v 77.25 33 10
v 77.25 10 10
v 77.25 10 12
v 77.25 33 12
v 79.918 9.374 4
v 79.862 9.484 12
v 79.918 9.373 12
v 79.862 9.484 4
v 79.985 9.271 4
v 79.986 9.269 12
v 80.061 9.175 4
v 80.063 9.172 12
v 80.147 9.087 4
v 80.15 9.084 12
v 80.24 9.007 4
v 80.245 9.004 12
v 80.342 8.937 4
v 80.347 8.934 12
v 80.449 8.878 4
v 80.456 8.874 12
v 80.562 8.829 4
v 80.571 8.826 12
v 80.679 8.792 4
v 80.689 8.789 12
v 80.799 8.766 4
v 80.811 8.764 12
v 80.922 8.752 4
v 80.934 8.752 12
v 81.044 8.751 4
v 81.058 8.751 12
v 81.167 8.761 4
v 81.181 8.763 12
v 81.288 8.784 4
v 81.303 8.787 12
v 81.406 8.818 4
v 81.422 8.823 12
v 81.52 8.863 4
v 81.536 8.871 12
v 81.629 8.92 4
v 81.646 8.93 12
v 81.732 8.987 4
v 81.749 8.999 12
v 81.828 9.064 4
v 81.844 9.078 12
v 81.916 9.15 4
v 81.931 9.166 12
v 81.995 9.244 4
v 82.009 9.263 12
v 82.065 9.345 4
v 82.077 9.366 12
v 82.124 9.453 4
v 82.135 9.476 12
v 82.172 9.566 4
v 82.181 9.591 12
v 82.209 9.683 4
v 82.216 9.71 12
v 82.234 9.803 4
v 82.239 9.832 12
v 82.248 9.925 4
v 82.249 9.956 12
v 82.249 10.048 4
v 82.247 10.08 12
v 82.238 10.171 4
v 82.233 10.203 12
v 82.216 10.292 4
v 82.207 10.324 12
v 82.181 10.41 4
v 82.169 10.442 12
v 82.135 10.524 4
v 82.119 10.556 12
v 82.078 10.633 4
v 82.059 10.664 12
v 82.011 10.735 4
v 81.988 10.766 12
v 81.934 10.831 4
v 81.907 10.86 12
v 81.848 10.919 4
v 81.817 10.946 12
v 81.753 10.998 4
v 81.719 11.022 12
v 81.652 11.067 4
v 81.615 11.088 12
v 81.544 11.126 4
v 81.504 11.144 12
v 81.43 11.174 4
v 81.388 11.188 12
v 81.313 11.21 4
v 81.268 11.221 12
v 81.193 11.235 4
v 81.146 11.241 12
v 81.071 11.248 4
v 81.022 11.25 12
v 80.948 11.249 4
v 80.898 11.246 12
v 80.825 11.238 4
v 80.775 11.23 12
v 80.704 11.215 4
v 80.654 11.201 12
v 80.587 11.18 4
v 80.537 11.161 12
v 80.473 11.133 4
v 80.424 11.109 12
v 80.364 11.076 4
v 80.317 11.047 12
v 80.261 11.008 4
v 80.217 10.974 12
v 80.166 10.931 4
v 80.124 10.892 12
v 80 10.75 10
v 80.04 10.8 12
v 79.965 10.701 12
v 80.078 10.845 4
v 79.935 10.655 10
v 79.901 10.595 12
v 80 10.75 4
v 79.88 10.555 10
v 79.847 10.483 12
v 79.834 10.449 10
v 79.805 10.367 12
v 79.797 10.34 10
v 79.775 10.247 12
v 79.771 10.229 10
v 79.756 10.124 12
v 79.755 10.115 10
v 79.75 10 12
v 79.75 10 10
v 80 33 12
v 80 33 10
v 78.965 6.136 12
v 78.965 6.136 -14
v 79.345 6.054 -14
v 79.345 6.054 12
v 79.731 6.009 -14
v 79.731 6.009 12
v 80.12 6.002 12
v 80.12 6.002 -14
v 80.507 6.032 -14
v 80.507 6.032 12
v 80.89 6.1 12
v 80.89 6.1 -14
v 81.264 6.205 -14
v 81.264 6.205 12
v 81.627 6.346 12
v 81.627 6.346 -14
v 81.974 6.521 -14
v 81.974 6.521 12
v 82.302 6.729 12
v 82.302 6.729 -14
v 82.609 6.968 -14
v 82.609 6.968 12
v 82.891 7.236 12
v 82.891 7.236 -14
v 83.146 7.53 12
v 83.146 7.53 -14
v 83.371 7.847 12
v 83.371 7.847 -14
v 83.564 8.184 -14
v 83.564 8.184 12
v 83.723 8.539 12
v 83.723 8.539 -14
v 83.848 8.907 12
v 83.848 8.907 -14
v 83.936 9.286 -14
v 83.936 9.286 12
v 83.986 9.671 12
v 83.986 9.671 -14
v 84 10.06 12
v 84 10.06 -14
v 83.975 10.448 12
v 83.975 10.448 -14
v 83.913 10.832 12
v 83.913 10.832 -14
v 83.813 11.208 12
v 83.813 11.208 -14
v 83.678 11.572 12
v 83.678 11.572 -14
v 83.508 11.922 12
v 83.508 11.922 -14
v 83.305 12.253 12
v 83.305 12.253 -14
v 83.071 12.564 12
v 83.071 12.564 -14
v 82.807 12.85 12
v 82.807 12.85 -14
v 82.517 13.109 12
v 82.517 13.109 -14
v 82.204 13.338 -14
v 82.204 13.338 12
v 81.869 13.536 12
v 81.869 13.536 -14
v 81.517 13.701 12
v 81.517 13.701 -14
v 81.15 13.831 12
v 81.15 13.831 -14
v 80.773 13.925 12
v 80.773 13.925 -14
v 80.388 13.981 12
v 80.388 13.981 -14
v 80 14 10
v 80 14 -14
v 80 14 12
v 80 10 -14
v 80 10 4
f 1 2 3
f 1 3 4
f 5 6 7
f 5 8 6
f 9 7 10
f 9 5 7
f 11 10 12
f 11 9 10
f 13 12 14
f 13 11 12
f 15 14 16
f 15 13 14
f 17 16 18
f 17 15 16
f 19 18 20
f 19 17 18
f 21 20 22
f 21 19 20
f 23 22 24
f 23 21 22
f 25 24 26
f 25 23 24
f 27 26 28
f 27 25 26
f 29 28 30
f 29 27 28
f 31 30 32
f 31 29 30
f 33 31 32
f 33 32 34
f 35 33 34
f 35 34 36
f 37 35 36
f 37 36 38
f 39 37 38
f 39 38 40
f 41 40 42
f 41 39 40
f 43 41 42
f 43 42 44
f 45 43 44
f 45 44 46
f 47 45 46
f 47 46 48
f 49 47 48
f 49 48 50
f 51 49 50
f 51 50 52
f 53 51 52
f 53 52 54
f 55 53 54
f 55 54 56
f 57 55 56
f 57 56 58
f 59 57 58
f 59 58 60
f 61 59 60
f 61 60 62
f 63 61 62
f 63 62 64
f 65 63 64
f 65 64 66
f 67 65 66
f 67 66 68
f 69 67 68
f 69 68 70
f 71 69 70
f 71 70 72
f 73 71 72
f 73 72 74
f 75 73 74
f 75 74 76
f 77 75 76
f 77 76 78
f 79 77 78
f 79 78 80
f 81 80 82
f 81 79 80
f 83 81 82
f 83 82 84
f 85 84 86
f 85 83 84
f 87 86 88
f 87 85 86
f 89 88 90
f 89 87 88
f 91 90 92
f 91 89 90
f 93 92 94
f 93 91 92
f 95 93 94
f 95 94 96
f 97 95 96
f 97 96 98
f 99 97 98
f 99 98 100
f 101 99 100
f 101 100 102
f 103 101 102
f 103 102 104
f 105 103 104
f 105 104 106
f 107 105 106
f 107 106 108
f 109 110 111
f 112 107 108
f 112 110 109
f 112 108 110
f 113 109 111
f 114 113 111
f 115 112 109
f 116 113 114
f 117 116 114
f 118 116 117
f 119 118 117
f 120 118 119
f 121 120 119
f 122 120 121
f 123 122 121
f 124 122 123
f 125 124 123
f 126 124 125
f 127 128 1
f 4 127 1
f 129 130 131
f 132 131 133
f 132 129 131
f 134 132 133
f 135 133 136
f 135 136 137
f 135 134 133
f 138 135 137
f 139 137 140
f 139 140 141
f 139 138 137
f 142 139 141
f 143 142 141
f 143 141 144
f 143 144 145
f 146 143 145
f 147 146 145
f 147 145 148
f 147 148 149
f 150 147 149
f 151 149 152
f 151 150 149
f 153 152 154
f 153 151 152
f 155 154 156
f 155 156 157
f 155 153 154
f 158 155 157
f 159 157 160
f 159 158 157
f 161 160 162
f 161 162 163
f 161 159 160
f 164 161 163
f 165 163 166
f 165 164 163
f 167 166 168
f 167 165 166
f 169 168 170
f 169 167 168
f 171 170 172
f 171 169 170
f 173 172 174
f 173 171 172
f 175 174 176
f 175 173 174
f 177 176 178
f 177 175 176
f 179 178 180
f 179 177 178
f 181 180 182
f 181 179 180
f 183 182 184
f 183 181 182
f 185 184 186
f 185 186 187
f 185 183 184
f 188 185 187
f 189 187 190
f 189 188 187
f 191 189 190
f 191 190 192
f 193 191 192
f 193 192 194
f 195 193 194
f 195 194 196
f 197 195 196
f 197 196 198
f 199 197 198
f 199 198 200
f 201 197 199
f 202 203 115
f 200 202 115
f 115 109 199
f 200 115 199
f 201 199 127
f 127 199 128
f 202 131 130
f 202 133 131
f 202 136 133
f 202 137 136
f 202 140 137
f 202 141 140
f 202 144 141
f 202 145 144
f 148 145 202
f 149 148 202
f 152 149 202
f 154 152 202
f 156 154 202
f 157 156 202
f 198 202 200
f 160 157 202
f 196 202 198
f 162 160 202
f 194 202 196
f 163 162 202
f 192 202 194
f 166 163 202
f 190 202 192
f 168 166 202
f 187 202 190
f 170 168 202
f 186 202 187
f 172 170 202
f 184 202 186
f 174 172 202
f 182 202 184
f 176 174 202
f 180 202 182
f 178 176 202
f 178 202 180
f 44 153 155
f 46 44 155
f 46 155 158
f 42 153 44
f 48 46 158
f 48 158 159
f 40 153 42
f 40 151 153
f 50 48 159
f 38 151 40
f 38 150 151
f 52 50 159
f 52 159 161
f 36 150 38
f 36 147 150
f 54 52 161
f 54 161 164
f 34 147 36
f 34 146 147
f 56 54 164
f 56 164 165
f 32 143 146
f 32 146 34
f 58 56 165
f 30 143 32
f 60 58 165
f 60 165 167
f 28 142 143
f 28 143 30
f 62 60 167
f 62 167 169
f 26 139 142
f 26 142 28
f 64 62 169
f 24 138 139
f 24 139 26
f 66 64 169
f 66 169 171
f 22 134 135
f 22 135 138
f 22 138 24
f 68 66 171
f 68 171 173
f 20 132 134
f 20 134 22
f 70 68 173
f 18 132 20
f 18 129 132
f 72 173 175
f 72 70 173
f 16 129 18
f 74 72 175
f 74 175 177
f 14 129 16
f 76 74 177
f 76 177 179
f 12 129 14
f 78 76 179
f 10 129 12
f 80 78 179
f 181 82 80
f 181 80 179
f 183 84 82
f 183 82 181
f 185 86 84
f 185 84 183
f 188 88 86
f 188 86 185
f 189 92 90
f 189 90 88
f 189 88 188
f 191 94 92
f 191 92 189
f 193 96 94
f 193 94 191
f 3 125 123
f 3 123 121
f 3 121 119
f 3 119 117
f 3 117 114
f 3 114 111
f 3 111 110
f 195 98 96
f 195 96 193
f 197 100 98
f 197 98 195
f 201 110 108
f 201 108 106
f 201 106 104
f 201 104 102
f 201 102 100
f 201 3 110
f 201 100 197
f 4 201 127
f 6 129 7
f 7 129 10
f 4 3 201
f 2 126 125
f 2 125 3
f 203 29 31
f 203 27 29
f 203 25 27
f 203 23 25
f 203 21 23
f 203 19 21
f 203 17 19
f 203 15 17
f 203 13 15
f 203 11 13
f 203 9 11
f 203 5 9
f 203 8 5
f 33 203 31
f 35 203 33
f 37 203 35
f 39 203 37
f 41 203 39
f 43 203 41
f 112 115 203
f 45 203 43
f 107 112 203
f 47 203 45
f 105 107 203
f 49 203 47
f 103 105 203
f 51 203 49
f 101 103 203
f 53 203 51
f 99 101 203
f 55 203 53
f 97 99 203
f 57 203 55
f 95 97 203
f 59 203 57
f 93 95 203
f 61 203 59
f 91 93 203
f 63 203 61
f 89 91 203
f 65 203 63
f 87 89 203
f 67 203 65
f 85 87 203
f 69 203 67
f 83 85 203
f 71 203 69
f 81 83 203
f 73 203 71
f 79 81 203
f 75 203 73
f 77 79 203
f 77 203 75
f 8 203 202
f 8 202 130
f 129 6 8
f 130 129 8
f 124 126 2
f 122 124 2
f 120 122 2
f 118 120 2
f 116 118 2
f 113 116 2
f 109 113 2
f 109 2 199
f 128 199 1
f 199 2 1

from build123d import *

# Parameters (mm, degrees)
CYLINDER005_R               = 1.25
CYLINDER005_DEPTH           = 10
BOX007_W                    = 23
BOX007_H                    = 2.75
BOX007_DEPTH                = 2
CYLINDER002_W               = 4
CYLINDER002_H               = 26
CYLINDER002_ANGLE           = 195
CYLINDER002_PLACEMENT_ANGLE = 105


with BuildPart() as b_so:
    # Cylinder005 → Cylinder005 (new body)
    with BuildSketch(Plane(origin=(41, 5, 4), x_dir=(1, 0, 0), z_dir=(0, 0, 1))):
        Circle(CYLINDER005_R)
    extrude(amount=CYLINDER005_DEPTH)


with BuildPart() as o001:
    # Box007 → Box007 (new body)
    with BuildSketch(Plane(origin=(40, 5, 10), x_dir=(0, 1, 0), z_dir=(0, 0, 1))):
        with Locations((11.5, 1.375)):
            Rectangle(BOX007_W, BOX007_H)
    extrude(amount=BOX007_DEPTH)


with BuildPart() as cut002_o:
    # Cylinder002 → Cylinder002 (revolve)
    with BuildSketch(Plane.XZ):
        with Locations((2, 13)):
            Rectangle(CYLINDER002_W, CYLINDER002_H)
    revolve(axis=Axis((0, 0, 0), (0, 0, 1)), revolution_arc=CYLINDER002_ANGLE)


with BuildPart() as cut002_o_1:
    # Cylinder002 placement: moved
    add(cut002_o.part.moved(Location((40, 5, -14))).rotate(Axis((40, 5, -14), (0, 0, -1)), CYLINDER002_PLACEMENT_ANGLE))

    # Fusion004: union O001
    add(o001.part)

    # Cut002: cut B_SO
    add(b_so.part, mode=Mode.SUBTRACT)


with BuildPart() as cut002_o_2:
    # Cut002 placement: moved
    add(cut002_o_1.part.moved(Location((40, 5, 0))))


solid = cut002_o_2.part
